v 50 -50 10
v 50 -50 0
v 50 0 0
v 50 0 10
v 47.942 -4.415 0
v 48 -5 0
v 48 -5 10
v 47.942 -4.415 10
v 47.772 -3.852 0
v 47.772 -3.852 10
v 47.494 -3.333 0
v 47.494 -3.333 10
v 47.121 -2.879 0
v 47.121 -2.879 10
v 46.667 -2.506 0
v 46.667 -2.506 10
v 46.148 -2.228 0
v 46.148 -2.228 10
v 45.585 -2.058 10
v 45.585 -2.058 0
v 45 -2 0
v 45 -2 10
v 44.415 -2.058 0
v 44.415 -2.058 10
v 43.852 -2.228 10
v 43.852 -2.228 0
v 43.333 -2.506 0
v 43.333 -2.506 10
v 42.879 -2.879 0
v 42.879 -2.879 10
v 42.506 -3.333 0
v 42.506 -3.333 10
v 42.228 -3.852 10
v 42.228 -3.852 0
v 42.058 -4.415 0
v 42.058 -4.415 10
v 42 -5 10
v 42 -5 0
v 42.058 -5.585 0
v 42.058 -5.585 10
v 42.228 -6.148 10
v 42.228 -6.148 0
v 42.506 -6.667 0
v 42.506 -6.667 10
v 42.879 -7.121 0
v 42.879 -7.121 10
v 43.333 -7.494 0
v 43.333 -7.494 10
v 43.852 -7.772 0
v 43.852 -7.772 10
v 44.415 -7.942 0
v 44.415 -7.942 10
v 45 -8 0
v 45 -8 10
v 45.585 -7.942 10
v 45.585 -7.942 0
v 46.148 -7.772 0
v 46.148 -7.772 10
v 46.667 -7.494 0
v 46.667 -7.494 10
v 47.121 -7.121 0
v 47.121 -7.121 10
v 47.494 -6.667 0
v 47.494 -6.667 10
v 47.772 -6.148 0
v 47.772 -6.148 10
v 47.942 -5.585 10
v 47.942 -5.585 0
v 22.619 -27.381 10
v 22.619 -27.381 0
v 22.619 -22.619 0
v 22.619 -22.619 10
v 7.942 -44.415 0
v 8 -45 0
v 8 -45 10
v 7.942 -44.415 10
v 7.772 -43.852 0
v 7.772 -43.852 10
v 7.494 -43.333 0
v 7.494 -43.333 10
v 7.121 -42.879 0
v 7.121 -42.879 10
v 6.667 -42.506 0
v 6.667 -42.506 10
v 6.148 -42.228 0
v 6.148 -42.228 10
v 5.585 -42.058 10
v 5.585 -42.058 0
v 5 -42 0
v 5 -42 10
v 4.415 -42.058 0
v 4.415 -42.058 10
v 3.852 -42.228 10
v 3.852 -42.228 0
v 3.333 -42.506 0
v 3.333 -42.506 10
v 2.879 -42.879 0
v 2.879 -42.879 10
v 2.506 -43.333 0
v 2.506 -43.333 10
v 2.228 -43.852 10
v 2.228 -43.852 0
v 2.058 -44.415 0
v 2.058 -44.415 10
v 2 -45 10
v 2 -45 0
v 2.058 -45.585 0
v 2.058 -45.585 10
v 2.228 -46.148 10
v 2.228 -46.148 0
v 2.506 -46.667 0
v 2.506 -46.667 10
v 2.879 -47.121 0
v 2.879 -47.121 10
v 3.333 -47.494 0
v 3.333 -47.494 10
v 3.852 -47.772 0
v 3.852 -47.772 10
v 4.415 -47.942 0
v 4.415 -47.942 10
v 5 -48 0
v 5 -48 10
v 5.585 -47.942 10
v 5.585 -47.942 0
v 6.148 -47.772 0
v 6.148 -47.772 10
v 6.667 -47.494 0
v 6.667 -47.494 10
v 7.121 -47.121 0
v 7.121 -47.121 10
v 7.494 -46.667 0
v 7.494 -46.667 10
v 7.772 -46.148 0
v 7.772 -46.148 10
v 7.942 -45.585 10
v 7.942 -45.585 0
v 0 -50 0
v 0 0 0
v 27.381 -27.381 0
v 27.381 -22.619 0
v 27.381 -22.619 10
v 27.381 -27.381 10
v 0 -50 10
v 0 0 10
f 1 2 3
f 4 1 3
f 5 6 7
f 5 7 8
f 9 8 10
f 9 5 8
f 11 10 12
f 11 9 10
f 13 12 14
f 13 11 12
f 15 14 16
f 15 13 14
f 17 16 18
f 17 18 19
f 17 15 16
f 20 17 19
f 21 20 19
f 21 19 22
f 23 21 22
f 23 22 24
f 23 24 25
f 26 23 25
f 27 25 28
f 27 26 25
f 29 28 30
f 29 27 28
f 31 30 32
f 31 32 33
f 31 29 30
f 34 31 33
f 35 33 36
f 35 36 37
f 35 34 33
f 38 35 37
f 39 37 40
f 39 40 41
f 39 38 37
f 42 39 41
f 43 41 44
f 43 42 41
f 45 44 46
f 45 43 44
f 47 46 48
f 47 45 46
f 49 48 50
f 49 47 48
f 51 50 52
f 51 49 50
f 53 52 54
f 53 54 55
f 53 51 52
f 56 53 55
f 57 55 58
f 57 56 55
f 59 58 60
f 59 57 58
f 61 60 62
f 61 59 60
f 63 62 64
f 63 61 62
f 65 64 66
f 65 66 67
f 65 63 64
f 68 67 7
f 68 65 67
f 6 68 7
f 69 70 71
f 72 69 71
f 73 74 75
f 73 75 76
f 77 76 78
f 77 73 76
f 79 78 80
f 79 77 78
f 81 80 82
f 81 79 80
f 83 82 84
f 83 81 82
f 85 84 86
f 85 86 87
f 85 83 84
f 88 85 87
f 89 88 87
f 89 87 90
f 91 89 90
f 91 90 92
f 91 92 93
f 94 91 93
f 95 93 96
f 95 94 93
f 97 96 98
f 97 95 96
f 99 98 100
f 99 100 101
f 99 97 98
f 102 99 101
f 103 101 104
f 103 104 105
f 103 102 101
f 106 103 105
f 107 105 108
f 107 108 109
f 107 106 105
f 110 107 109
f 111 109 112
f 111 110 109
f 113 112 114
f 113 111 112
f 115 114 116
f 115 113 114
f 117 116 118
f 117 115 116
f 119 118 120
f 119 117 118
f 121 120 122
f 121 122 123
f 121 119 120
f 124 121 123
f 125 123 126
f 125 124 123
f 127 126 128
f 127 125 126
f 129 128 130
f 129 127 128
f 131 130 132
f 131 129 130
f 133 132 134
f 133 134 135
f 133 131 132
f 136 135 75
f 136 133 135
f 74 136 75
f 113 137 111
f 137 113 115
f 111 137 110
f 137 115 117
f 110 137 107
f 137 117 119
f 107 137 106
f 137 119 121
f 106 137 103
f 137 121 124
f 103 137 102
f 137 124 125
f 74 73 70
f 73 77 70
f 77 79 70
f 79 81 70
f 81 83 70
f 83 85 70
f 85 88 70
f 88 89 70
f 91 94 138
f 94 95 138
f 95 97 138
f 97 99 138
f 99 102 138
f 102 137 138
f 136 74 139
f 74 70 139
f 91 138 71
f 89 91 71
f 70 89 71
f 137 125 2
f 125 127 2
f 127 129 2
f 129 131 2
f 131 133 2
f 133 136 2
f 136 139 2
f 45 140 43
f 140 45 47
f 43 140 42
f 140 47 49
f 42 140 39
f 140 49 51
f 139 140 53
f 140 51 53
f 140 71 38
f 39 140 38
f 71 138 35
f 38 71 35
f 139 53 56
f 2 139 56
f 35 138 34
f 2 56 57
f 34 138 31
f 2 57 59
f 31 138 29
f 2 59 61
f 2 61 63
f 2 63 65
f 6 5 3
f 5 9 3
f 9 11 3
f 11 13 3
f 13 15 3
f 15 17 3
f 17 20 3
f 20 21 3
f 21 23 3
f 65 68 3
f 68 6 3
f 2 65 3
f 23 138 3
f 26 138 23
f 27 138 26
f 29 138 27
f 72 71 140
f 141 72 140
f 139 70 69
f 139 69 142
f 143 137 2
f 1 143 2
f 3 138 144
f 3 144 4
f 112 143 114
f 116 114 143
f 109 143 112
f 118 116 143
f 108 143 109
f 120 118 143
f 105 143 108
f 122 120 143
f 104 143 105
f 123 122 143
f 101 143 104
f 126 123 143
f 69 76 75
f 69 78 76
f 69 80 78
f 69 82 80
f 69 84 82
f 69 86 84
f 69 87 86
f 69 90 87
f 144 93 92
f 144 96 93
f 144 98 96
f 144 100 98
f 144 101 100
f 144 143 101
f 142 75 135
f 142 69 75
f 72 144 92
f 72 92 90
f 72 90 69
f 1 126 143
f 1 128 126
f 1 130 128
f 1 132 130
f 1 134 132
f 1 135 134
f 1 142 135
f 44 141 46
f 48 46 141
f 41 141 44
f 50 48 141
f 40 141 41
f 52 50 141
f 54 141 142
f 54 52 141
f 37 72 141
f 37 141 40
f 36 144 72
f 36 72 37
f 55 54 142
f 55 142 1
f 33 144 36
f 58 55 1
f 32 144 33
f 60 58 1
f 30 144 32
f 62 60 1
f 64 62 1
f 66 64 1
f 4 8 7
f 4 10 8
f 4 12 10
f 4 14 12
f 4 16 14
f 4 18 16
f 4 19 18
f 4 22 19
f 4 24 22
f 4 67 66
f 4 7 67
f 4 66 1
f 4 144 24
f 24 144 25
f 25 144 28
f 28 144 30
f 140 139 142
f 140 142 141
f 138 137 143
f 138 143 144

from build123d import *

# Parameters (mm, degrees)
F0_W     = 50
F0_H     = 50
F0_R     = 3
F0_W_2   = 4.7625
F0_H_2   = 4.7625
F1_DEPTH = 10


with BuildPart() as f1:
    # F0 (on Top) → F1 (new body)
    with BuildSketch(Plane.XY):
        with Locations((25, -25)):
            Rectangle(F0_W, F0_H)
        with Locations((5, -45)):
            Circle(F0_R, mode=Mode.SUBTRACT)
        with Locations((25, -25)):
            Rectangle(F0_W_2, F0_H_2, mode=Mode.SUBTRACT)
        with Locations((45, -5)):
            Circle(F0_R, mode=Mode.SUBTRACT)
    extrude(amount=F1_DEPTH)


solid = f1.part
